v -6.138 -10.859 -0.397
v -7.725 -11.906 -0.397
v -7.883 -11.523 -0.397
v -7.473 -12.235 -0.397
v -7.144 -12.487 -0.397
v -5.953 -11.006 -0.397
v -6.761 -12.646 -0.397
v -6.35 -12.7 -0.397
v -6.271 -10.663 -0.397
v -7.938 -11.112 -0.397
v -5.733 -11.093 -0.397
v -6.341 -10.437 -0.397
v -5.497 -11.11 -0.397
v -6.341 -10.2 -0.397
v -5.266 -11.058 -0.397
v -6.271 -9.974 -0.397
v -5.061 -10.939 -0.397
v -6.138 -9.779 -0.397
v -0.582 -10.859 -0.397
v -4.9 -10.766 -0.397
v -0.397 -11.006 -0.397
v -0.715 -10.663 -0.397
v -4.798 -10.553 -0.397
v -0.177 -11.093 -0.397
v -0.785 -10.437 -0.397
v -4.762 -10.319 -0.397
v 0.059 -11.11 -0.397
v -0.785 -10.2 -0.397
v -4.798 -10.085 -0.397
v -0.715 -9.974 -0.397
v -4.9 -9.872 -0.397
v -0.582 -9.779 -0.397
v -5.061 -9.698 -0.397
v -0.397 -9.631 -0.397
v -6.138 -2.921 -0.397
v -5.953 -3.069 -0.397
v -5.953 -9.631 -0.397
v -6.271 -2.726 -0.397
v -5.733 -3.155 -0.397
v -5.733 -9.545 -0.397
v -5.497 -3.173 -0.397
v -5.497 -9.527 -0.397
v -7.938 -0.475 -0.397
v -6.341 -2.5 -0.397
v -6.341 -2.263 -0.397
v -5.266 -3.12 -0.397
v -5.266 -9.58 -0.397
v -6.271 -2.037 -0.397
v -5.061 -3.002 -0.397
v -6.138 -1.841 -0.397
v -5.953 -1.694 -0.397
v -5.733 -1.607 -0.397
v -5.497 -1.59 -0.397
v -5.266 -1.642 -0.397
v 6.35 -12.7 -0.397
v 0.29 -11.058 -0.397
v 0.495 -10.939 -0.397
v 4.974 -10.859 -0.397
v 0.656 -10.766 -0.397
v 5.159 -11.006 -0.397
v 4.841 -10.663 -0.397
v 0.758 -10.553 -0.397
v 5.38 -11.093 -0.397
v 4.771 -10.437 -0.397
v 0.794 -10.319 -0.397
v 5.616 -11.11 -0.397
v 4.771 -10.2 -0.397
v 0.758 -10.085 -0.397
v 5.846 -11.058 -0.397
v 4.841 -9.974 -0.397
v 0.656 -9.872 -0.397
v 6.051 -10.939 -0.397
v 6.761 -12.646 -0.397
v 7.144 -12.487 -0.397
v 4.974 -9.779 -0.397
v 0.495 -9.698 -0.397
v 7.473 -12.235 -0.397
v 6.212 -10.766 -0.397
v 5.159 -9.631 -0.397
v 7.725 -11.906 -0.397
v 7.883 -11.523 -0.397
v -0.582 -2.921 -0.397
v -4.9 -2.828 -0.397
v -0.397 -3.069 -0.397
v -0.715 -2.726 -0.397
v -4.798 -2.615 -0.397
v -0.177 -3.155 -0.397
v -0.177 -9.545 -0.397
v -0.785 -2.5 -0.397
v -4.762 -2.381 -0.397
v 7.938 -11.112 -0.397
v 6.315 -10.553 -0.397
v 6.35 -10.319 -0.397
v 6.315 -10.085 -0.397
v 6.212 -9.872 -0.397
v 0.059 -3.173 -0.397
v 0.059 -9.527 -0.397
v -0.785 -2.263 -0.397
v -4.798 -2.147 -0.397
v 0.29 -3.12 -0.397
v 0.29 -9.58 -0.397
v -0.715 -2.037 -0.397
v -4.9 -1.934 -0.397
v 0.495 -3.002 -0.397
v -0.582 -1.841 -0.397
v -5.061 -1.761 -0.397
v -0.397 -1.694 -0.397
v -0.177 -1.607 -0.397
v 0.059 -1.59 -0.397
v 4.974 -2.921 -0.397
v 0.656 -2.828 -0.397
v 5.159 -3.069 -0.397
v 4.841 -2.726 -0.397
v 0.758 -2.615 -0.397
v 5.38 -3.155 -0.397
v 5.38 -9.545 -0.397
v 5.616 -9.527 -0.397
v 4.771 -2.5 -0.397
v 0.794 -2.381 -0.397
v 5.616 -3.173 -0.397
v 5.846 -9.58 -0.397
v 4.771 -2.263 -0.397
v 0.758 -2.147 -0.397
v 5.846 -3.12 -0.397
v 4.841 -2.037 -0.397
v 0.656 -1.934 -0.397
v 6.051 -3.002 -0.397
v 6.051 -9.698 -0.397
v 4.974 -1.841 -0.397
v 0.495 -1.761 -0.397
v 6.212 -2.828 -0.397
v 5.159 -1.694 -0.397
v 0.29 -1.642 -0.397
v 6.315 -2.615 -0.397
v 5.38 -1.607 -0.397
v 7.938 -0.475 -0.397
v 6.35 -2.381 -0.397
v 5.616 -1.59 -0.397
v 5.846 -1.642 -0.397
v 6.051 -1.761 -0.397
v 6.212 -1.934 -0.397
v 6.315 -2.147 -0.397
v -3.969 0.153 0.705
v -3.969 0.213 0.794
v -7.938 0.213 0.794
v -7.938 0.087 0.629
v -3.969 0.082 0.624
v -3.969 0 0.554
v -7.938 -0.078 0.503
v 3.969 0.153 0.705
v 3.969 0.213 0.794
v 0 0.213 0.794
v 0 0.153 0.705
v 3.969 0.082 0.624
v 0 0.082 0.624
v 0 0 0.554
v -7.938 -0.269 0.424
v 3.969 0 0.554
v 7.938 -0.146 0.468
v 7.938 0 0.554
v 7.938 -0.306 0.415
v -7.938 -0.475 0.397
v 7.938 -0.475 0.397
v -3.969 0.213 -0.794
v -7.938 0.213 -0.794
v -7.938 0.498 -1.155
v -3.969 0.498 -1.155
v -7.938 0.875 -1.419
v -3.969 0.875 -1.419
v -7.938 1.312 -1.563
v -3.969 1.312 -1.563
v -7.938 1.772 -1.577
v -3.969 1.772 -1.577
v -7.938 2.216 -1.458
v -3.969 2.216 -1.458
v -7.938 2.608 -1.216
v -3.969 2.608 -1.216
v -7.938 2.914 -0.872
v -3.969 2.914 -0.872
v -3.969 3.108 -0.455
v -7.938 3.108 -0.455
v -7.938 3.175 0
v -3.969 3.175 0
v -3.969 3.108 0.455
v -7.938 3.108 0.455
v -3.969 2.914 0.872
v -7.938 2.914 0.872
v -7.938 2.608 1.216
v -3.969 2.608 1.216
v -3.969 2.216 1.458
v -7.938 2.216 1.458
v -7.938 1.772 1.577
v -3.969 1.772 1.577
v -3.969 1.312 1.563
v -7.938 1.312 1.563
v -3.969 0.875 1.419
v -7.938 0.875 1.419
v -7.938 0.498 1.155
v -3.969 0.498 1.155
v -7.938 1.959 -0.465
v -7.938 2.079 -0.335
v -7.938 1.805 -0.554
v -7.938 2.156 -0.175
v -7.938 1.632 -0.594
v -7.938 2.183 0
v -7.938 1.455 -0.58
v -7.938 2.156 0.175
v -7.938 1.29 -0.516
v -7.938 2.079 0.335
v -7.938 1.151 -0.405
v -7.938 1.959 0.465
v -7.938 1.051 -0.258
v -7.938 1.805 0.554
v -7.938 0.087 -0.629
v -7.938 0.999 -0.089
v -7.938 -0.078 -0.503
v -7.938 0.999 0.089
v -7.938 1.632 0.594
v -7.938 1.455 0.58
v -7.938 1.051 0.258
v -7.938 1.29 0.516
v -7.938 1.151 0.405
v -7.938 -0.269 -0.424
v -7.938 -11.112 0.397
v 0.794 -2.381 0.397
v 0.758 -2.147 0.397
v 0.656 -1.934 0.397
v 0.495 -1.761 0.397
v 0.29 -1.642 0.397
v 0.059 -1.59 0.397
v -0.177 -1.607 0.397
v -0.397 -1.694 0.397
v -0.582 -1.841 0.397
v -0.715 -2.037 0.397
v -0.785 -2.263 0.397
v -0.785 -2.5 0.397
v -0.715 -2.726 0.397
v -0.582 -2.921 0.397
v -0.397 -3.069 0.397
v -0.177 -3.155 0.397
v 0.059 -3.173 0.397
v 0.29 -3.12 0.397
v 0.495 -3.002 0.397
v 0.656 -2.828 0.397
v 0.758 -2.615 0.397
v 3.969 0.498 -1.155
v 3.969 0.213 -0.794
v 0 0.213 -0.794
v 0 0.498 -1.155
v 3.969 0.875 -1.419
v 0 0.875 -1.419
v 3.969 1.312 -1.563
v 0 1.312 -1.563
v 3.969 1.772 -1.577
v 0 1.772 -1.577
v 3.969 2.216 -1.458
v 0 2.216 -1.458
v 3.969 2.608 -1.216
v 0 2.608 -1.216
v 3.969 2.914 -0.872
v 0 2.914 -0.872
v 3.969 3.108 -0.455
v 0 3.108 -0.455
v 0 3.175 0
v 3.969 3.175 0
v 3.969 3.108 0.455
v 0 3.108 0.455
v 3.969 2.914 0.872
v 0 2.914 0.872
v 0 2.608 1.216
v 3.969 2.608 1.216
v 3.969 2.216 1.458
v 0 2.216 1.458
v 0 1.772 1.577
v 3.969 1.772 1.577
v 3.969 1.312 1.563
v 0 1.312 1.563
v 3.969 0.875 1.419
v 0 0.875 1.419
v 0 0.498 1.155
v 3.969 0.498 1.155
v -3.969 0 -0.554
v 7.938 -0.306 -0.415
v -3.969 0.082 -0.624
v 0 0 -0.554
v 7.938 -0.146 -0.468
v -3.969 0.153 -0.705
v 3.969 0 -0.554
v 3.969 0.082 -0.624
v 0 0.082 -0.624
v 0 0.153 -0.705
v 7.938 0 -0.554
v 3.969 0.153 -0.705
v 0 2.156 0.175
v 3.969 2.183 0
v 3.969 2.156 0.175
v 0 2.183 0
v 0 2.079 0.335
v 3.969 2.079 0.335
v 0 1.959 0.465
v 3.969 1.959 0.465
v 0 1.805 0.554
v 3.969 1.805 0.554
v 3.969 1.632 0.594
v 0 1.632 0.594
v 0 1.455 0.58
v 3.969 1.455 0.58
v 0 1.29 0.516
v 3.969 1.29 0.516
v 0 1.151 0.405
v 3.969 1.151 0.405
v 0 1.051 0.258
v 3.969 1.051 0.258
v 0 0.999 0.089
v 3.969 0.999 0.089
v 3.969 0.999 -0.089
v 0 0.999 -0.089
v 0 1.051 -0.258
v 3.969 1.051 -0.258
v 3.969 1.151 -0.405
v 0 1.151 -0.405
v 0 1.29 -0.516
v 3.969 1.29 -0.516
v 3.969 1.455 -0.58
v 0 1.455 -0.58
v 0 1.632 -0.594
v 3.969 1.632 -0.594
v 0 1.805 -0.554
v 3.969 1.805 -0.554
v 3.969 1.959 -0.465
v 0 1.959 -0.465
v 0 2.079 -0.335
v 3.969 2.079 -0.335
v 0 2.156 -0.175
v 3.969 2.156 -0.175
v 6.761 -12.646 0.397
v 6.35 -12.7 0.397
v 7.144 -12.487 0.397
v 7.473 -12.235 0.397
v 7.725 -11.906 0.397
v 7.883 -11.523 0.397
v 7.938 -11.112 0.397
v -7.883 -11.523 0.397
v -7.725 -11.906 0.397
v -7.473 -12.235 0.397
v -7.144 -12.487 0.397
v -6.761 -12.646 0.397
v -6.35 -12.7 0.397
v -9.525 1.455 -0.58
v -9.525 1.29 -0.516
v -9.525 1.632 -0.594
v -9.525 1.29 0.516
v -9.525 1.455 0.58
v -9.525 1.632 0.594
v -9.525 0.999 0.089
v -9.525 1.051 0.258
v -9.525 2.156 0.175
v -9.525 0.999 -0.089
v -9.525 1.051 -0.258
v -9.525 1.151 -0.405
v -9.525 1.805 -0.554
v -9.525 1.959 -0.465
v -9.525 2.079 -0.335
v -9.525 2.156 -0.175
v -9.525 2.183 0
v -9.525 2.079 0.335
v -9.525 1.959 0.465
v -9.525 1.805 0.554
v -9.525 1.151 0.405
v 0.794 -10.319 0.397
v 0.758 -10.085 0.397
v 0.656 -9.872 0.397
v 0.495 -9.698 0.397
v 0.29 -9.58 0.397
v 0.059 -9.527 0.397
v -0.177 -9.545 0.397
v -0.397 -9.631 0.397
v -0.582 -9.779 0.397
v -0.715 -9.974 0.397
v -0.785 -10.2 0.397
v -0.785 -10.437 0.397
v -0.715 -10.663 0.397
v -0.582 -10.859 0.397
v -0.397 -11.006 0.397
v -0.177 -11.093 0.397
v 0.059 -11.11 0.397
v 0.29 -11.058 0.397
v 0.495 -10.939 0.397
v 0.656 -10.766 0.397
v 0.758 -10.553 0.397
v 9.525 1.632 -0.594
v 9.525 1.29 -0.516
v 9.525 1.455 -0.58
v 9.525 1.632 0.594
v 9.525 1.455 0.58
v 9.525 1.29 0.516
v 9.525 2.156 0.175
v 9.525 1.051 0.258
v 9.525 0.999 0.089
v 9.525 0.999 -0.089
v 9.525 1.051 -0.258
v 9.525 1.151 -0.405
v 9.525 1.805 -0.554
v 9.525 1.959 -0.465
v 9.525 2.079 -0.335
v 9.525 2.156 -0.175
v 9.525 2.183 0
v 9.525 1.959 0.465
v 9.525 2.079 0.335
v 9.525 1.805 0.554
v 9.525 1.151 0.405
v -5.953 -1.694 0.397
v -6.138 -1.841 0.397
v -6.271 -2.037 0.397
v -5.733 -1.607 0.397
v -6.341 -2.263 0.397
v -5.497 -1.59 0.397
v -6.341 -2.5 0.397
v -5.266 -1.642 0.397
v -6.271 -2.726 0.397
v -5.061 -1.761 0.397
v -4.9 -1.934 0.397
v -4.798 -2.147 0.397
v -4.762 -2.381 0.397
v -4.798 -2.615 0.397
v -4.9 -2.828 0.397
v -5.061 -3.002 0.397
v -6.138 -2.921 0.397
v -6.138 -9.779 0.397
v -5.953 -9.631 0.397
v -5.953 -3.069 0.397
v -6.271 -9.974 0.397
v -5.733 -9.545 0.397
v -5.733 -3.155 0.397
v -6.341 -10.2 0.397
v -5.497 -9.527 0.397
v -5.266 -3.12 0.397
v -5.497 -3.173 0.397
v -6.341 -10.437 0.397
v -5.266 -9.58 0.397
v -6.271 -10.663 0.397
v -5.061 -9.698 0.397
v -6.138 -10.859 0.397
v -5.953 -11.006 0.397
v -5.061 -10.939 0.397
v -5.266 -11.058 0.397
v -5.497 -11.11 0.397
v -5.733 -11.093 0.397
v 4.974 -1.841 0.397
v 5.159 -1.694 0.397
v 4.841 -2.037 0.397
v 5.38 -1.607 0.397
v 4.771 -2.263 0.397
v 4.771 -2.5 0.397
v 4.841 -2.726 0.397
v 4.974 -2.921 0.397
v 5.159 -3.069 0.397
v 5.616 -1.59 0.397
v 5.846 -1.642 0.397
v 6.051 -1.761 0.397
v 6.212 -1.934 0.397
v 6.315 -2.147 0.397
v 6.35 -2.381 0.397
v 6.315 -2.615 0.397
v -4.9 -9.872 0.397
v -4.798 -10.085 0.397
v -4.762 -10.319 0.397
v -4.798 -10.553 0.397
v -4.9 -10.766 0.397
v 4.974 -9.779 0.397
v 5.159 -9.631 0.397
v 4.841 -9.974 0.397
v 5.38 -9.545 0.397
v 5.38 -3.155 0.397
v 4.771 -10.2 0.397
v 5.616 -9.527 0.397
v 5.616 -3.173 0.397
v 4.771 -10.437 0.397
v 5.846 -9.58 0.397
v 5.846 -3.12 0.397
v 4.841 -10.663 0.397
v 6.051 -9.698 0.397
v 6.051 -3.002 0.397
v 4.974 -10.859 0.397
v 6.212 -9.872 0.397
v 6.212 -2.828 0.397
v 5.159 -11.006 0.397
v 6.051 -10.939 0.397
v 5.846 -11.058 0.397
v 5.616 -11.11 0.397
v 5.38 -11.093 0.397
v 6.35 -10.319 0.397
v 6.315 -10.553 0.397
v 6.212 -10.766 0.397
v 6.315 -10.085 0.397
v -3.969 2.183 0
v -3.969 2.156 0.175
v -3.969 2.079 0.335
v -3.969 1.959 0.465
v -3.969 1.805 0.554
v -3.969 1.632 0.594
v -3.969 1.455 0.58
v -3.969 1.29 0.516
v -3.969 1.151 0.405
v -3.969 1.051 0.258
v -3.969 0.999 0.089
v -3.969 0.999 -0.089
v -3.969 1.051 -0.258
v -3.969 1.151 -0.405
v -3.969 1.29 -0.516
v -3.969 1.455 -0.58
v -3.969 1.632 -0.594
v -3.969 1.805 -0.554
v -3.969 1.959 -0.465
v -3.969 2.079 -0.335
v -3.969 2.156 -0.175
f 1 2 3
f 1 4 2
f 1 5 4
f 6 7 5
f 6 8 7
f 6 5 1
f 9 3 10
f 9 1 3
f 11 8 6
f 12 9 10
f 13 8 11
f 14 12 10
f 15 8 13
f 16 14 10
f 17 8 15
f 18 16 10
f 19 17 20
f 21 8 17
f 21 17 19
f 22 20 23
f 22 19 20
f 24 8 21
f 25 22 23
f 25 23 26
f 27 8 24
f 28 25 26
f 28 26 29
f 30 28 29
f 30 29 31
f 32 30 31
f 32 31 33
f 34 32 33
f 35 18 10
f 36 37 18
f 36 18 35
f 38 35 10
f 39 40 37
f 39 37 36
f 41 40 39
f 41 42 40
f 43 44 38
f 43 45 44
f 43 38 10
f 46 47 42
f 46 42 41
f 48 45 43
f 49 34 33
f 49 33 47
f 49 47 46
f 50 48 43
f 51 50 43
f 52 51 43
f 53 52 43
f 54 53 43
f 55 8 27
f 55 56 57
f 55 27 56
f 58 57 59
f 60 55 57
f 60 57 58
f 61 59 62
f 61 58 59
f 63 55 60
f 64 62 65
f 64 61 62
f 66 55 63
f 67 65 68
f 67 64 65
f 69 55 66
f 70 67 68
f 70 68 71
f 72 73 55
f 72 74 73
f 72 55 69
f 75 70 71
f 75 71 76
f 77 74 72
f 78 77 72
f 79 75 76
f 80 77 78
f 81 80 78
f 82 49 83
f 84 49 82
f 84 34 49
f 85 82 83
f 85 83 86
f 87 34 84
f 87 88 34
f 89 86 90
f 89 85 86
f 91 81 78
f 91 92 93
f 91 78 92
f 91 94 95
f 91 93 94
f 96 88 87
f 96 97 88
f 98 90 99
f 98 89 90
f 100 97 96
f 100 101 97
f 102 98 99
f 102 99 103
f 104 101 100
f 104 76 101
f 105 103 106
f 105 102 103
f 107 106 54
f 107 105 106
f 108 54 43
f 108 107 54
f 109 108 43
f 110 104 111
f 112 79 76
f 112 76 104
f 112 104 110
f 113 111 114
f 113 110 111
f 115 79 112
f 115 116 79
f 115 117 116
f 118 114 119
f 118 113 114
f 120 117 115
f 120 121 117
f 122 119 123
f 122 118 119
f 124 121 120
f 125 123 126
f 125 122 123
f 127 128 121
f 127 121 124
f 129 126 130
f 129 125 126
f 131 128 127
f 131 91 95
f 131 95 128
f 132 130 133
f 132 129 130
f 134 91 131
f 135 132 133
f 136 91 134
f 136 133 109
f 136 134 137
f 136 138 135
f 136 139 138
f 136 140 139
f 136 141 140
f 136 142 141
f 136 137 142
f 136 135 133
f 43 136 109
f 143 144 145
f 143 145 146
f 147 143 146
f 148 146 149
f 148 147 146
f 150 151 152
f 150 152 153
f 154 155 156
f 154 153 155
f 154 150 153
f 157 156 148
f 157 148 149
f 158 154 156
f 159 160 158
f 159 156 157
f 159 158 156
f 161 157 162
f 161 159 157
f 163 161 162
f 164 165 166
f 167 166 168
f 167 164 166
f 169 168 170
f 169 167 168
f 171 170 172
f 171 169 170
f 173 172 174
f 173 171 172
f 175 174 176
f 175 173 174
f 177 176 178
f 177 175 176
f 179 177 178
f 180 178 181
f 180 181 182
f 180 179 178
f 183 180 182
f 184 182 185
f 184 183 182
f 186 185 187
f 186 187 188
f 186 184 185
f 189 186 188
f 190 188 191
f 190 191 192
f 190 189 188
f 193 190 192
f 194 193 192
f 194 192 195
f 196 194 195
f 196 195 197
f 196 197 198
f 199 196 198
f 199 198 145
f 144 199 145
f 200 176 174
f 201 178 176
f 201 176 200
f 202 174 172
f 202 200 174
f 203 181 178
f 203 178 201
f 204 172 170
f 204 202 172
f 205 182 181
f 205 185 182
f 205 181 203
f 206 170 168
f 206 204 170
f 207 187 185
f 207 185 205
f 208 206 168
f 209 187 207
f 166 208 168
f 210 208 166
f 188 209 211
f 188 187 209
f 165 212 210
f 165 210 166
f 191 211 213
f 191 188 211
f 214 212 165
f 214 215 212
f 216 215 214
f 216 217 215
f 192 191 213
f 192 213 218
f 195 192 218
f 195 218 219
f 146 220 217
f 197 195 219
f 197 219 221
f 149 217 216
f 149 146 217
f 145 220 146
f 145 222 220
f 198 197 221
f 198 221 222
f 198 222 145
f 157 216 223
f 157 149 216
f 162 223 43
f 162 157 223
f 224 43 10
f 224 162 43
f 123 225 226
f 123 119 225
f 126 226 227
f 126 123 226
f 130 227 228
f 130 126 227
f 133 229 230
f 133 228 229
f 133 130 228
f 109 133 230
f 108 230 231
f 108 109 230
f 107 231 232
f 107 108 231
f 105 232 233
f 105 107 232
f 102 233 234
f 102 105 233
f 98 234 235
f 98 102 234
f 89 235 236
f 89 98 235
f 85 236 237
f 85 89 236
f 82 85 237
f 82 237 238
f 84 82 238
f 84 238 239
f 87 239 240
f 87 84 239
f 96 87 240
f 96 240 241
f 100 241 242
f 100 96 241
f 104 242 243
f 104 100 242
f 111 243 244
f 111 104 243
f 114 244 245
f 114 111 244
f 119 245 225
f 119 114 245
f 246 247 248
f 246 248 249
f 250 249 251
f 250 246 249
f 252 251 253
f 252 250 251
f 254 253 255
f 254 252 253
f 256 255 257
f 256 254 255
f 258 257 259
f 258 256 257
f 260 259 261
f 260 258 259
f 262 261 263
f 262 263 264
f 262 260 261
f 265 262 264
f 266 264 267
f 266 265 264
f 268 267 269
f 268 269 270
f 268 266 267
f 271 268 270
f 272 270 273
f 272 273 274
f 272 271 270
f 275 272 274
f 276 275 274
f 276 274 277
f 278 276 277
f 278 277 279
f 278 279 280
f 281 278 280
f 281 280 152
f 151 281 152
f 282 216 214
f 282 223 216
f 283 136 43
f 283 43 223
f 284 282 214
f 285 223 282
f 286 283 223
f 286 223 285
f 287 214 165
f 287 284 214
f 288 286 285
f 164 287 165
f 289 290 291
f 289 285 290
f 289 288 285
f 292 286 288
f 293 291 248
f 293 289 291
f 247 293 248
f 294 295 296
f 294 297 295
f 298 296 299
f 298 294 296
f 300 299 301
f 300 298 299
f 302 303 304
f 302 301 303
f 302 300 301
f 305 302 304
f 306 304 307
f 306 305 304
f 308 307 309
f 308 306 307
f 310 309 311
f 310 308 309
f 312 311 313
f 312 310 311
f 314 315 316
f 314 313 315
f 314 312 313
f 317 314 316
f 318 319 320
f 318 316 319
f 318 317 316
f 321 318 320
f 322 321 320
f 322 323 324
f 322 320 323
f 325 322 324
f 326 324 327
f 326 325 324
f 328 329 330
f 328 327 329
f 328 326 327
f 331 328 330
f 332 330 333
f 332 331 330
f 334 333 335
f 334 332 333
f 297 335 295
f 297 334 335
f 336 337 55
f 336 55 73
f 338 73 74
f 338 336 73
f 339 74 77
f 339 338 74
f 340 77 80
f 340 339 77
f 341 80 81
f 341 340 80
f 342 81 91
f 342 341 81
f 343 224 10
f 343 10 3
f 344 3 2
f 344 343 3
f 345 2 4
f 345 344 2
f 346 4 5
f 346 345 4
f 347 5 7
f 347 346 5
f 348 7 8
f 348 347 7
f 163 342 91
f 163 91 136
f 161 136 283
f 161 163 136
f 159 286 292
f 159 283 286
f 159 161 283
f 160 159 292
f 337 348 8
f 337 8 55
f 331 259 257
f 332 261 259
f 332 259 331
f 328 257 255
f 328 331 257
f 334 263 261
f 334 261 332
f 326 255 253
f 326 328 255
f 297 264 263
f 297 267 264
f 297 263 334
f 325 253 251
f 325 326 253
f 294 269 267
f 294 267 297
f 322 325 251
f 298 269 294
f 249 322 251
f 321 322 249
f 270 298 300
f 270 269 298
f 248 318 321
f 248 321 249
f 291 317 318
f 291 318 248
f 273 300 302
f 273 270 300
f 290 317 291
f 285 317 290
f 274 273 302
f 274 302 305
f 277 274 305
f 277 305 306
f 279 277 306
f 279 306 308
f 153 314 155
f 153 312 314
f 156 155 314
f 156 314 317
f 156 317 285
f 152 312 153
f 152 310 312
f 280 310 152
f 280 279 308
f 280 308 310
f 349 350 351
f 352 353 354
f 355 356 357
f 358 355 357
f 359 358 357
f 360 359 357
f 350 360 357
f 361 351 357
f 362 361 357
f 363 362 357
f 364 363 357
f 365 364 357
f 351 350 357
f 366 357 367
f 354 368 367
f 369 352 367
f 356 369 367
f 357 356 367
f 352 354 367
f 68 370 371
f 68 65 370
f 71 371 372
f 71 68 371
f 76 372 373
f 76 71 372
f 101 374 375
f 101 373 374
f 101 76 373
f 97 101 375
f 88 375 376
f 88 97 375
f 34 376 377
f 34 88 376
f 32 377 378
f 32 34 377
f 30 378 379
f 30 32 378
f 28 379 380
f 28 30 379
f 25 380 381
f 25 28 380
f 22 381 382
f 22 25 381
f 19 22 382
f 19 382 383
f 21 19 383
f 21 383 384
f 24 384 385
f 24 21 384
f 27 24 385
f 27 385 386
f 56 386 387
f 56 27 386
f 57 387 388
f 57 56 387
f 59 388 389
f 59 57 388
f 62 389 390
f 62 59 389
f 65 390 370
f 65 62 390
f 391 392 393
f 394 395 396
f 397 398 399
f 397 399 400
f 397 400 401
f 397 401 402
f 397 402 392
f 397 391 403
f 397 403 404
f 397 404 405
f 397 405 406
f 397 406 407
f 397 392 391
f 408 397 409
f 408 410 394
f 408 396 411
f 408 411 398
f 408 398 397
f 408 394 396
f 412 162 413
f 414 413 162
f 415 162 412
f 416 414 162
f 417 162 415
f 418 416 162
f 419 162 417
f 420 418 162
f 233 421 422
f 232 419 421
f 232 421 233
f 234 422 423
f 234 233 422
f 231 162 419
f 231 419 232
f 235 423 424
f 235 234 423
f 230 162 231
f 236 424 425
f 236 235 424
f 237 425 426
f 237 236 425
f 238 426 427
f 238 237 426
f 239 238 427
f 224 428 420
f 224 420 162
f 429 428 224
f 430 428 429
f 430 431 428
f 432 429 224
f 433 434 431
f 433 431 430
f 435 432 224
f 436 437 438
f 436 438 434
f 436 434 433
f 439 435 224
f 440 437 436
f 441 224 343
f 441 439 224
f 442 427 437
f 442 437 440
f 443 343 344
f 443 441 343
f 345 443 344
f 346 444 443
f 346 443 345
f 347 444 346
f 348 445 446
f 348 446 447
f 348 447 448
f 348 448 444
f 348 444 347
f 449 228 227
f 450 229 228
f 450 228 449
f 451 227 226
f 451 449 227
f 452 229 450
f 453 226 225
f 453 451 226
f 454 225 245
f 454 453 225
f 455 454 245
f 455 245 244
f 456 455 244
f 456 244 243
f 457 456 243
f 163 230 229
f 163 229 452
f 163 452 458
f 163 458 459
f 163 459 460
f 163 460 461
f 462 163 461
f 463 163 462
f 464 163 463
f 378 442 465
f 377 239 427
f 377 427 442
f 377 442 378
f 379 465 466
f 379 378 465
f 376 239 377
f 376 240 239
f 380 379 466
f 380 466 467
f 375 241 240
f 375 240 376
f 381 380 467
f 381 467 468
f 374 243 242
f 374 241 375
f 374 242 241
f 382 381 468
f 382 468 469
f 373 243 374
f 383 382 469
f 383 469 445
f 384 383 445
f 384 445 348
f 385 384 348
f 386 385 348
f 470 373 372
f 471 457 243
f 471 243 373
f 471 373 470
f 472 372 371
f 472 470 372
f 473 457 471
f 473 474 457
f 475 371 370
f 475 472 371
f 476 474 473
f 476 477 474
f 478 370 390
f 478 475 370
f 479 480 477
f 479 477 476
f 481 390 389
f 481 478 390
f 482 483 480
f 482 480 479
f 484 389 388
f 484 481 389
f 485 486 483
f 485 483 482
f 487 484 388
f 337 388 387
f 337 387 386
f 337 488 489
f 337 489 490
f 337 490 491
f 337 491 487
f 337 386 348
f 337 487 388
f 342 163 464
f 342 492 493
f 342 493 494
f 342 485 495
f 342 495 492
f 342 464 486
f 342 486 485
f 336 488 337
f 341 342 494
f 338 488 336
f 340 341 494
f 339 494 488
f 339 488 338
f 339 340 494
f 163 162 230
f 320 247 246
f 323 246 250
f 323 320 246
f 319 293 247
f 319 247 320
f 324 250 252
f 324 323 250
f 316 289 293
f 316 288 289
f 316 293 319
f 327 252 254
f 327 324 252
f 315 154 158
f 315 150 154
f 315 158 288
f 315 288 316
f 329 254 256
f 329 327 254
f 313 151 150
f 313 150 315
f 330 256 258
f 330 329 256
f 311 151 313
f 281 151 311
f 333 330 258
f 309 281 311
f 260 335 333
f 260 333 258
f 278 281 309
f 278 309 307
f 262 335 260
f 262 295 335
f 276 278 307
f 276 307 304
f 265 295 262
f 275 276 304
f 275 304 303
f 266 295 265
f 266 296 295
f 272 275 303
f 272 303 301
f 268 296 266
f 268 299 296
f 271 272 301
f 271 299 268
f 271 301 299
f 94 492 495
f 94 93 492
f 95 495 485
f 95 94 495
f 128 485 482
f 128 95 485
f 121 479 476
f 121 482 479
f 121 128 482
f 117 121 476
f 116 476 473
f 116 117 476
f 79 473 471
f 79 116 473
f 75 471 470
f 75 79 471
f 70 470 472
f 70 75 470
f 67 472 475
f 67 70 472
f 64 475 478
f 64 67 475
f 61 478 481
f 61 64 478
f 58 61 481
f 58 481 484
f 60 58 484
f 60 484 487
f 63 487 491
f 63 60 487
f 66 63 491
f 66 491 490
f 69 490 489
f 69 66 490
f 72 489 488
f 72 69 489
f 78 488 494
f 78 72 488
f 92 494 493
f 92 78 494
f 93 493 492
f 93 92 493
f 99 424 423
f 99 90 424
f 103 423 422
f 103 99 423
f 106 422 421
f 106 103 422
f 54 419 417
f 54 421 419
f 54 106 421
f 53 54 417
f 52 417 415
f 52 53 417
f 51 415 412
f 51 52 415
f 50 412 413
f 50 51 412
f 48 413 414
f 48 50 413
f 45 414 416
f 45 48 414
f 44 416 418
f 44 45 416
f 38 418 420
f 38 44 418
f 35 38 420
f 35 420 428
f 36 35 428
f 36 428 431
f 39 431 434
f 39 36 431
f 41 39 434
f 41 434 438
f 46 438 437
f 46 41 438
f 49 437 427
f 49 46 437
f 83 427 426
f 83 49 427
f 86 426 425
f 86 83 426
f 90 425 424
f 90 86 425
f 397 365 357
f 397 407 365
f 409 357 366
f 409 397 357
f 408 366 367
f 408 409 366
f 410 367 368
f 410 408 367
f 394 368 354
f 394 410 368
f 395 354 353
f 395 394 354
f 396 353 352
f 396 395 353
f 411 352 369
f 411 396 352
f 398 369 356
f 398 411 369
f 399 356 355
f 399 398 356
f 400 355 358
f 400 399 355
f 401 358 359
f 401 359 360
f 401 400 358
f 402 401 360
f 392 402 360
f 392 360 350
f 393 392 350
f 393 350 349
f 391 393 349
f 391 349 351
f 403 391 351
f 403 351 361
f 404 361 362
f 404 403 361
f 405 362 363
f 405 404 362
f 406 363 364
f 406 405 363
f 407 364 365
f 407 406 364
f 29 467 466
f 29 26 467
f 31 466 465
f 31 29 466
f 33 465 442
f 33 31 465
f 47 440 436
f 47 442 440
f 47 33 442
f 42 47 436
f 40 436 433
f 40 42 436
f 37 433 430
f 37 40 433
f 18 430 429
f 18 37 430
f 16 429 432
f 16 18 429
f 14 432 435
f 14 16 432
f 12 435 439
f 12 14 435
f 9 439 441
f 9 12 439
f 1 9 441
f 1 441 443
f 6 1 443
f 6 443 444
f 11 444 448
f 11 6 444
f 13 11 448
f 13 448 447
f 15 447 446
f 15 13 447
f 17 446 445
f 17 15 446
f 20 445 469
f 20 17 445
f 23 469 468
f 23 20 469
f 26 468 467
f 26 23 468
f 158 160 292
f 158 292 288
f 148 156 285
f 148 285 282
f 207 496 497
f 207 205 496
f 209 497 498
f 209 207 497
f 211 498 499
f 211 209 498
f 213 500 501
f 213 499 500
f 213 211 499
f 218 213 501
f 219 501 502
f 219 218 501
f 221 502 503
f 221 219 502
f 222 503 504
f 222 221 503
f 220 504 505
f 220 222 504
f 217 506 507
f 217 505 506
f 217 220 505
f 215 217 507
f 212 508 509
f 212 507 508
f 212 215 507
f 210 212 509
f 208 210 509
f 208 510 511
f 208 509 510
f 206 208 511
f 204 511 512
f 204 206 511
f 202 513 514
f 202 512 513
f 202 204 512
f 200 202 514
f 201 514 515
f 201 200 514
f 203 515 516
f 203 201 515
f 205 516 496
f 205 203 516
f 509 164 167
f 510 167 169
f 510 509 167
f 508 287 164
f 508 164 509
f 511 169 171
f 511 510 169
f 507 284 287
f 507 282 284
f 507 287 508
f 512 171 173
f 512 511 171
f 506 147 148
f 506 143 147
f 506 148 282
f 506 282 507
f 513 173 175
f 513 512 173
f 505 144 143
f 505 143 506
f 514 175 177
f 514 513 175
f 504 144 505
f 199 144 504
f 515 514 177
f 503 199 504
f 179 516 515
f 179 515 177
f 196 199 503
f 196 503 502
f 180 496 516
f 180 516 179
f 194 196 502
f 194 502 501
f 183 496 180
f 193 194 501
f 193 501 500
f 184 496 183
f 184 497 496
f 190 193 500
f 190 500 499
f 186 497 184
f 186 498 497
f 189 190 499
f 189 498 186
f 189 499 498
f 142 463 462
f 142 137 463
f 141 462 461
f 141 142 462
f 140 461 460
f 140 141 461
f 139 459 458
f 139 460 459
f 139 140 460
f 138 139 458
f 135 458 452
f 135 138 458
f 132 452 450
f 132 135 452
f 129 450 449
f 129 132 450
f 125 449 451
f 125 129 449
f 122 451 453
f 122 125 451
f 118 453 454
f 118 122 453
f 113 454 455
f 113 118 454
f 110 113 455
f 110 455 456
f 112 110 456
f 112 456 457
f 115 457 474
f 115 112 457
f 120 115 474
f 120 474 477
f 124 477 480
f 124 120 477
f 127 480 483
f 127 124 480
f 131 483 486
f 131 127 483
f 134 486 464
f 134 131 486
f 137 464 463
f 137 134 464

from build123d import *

# Parameters (mm, degrees)
F0_R     = 0.79375
F2_DEPTH = 1.5875
F1_R     = 0.595313
F3_DEPTH = 12.7
F4_DEPTH = 9.525


with BuildPart() as f2:
    # F0 (on Top) → F2 (new body, symmetric)
    with BuildSketch(Plane.XY):
        with BuildLine():
            Line((-3.96875, 3.175), (-7.9375, 3.175))
            Line((-7.9375, 3.175), (-7.9375, -11.1125))
            ThreePointArc((-7.9375, -11.1125), (-7.472532, -12.235032), (-6.35, -12.7))
            Line((-6.35, -12.7), (6.35, -12.7))
            ThreePointArc((6.35, -12.7), (7.472532, -12.235032), (7.9375, -11.1125))
            Line((7.9375, -11.1125), (7.9375, 0))
            Line((7.9375, 0), (3.96875, 0))
            Line((3.96875, 0), (3.96875, 3.175))
            Line((3.96875, 3.175), (0, 3.175))
            Line((0, 3.175), (0, 0))
            Line((0, 0), (-3.96875, 0))
            Line((-3.96875, 0), (-3.96875, 3.175))
        make_face()
        with Locations((-5.55625, -10.31875)):
            Circle(F0_R, mode=Mode.SUBTRACT)
        with Locations((0, -10.31875)):
            Circle(F0_R, mode=Mode.SUBTRACT)
        with Locations((5.55625, -10.31875)):
            Circle(F0_R, mode=Mode.SUBTRACT)
        with Locations((-5.55625, -2.38125)):
            Circle(F0_R, mode=Mode.SUBTRACT)
        with Locations((0, -2.38125)):
            Circle(F0_R, mode=Mode.SUBTRACT)
        with Locations((5.55625, -2.38125)):
            Circle(F0_R, mode=Mode.SUBTRACT)
    extrude(amount=F2_DEPTH, both=True)

    # F1 (on Right) → F3 (intersect, symmetric)
    with BuildSketch(Plane.YZ):
        with BuildLine():
            Line((-12.7, 0.396875), (-12.7, -0.396875))
            Line((-12.7, -0.396875), (-0.474723, -0.396875))
            ThreePointArc((-0.474723, -0.396875), (-0.077848, -0.503217), (0.212685, -0.79375))
            ThreePointArc((0.212685, -0.79375), (3.175, 0), (0.212685, 0.79375))
            ThreePointArc((0.212685, 0.79375), (-0.077848, 0.503217), (-0.474723, 0.396875))
            Line((-0.474723, 0.396875), (-12.7, 0.396875))
        make_face()
        with Locations((1.5875, 0)):
            Circle(F1_R, mode=Mode.SUBTRACT)
    extrude(amount=F3_DEPTH, both=True, mode=Mode.INTERSECT)


with BuildPart() as f4:
    # F1 (on Right) → F4 (new body, symmetric)
    with BuildSketch(Plane.YZ):
        with Locations((1.5875, 0)):
            Circle(F1_R)
    extrude(amount=F4_DEPTH, both=True)


solid = Compound([f2.part, f4.part])
